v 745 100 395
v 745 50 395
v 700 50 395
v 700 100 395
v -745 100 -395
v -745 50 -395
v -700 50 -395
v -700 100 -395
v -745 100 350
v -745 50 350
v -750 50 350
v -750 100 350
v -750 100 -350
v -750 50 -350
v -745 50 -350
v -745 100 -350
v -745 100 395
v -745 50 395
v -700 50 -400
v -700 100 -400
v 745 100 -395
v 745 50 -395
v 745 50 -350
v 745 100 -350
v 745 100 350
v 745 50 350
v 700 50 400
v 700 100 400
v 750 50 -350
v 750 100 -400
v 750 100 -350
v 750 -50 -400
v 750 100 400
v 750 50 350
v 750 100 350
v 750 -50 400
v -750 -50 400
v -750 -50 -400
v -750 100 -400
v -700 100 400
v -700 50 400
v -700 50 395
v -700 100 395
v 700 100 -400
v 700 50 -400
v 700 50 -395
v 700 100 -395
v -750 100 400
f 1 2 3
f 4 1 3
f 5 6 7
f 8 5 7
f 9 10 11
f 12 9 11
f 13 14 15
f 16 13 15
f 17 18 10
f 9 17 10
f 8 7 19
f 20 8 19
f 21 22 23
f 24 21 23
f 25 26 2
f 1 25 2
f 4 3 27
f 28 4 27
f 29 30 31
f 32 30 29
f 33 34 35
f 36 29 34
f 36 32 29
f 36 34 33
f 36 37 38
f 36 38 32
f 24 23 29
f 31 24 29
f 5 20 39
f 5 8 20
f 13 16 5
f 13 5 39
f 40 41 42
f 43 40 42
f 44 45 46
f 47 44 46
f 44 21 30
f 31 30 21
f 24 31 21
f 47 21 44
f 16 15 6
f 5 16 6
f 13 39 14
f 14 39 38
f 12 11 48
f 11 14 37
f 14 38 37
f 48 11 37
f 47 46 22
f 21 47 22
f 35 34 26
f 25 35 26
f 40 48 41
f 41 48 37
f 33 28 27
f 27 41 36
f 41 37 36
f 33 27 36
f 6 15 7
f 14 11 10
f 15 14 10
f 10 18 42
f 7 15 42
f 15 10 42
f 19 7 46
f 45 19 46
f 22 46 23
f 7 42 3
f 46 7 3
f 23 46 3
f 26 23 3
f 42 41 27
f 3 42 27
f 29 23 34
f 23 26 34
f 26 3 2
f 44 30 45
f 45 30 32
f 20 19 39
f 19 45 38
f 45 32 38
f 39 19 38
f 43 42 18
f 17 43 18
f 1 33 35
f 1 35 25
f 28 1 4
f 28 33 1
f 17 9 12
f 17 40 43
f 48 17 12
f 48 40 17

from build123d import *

# Parameters (mm, degrees)
F0_W     = 1500
F0_H     = 800
F1_DEPTH = 50
F3_DEPTH = 50


with BuildPart() as f1:
    # F0 (on Front) → F1 (new body, symmetric)
    with BuildSketch(Plane.XZ):
        Rectangle(F0_W, F0_H)
    extrude(amount=F1_DEPTH, both=True)

    # F2 (on face) → F3 (join)
    with BuildSketch(Plane(origin=(0, 50, 0), x_dir=(-1, 0, 0), z_dir=(0, 1, 0))):
        Polygon((700, -400), (750, -400), (750, -350), (745, -350), (745, -395), (700, -395), align=None)
        Polygon((-750, -400), (-700, -400), (-700, -395), (-745, -395), (-745, -350), (-750, -350), align=None)
        Polygon((-700, 395), (-700, 400), (-750, 400), (-750, 350), (-745, 350), (-745, 395), align=None)
        Polygon((745, 350), (750, 350), (750, 400), (700, 400), (700, 395), (745, 395), align=None)
    extrude(amount=F3_DEPTH)


solid = f1.part
